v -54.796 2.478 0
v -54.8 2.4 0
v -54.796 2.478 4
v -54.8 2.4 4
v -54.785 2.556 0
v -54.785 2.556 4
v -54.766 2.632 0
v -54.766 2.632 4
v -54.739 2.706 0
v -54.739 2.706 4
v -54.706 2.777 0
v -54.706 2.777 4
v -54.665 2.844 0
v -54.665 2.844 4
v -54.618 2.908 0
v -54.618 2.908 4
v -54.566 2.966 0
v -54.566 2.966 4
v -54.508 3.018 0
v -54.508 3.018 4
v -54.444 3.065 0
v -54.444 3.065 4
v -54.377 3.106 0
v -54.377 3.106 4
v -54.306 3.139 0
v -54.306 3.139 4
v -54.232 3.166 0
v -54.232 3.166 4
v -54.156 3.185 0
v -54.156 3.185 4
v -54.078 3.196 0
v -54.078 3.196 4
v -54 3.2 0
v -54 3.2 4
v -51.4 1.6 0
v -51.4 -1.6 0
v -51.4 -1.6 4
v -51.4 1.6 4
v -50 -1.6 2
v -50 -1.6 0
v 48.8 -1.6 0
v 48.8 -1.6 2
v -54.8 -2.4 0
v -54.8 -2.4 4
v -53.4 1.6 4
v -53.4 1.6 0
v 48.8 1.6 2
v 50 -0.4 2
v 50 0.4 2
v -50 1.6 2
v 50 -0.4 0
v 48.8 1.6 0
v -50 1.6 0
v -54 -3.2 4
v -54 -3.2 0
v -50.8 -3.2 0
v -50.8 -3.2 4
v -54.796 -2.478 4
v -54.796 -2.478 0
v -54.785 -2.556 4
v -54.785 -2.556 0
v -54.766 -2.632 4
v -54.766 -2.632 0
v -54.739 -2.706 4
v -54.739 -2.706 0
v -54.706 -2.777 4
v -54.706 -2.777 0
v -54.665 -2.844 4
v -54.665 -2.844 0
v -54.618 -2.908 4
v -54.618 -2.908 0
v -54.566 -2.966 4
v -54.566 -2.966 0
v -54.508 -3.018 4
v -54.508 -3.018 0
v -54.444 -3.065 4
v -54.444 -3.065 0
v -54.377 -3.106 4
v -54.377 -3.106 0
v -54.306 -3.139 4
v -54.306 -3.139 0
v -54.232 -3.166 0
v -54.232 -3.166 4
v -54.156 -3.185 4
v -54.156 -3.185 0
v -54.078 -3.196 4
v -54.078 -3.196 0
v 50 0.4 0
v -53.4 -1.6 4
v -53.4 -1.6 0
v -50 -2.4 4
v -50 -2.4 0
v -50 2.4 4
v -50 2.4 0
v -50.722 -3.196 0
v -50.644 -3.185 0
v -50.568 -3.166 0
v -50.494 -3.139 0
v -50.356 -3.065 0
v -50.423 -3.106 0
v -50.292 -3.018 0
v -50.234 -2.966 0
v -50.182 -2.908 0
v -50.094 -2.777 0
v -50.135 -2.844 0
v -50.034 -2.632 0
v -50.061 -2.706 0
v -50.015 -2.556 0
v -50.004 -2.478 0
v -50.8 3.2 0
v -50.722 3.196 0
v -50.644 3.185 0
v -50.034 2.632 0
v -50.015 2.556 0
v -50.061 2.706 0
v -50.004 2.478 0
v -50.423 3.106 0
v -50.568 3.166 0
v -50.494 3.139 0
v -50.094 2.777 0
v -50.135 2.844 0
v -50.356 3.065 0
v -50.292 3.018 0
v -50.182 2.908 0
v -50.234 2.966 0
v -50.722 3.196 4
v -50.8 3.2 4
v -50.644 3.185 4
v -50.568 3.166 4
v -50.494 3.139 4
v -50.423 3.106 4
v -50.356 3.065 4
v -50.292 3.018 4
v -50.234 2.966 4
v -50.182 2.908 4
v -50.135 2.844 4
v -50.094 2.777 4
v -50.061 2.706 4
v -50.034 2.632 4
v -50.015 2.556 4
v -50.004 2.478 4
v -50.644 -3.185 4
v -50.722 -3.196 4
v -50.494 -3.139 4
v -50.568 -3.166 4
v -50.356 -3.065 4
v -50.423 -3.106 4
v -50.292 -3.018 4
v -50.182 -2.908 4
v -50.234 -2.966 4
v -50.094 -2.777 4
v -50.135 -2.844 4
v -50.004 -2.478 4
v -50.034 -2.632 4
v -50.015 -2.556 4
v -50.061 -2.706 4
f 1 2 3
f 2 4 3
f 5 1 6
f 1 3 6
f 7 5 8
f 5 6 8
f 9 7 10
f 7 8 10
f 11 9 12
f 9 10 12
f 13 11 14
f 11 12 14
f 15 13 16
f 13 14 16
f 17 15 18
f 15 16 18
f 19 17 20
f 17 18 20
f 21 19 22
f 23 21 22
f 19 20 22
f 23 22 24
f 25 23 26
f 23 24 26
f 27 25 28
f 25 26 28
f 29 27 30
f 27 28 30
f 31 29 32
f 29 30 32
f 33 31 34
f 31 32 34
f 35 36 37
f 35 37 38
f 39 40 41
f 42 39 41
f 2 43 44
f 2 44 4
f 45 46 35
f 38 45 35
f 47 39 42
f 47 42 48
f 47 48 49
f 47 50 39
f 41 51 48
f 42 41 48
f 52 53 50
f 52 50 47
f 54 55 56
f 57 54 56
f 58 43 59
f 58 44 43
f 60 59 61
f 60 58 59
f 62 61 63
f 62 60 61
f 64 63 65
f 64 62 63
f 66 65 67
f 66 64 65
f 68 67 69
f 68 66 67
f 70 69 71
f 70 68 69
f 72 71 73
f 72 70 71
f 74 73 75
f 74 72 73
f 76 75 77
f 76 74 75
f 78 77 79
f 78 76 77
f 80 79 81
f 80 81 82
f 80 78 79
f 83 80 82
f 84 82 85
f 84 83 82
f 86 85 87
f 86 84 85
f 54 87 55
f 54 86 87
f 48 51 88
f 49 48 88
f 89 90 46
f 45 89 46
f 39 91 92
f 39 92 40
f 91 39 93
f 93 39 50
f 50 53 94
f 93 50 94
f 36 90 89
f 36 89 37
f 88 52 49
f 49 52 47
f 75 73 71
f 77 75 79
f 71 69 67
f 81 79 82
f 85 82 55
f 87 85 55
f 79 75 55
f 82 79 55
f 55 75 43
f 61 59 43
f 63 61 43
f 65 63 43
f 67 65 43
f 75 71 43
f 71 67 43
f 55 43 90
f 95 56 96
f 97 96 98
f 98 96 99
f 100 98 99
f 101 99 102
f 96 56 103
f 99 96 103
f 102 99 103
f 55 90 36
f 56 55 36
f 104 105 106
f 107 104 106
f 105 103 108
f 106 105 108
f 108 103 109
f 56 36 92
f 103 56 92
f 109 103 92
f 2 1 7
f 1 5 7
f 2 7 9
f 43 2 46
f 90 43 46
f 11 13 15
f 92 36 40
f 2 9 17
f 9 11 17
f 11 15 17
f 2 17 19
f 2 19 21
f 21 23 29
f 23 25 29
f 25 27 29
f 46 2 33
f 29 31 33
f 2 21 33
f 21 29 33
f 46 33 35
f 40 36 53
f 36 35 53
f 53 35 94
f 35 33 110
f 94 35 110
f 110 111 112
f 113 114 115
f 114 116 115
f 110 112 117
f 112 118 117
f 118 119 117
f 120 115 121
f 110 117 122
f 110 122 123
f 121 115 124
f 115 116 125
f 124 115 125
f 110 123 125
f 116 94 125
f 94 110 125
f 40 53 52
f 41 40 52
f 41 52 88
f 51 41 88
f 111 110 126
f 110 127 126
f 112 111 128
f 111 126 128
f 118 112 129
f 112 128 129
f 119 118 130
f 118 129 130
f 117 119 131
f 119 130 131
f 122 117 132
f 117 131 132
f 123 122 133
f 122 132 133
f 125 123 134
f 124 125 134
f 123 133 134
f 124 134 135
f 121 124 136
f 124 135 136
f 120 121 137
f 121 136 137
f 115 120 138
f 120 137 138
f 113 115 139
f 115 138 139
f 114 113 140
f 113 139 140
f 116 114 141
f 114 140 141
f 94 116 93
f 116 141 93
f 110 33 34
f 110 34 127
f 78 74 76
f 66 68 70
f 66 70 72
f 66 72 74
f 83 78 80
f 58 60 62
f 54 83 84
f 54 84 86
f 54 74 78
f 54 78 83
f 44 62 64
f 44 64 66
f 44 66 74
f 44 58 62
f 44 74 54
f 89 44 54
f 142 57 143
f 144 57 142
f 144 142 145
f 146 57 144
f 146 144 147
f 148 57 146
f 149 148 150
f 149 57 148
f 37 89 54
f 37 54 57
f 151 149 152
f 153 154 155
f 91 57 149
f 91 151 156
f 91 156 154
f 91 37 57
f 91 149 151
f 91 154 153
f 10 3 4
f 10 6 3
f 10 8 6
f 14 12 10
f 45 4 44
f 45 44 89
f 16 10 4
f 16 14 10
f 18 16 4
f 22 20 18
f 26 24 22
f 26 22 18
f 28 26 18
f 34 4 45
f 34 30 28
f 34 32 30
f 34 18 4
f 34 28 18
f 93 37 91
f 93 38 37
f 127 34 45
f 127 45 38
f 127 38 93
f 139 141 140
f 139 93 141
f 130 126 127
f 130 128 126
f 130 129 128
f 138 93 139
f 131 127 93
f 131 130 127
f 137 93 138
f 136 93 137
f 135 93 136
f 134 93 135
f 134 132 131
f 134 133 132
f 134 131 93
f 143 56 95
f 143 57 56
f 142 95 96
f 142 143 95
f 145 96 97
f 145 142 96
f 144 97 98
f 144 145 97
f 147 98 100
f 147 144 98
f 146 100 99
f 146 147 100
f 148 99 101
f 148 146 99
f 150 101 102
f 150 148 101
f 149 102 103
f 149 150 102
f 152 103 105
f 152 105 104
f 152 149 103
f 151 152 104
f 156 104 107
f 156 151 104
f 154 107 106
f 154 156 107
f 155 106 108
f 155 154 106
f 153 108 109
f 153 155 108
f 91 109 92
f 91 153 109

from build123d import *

# Parameters (mm, degrees)
F0_W     = 100
F0_H     = 3.2
F1_DEPTH = 2
F2_SIZE  = 1.2
F3_W     = 4.8
F3_H     = 6.4
F3_W_2   = 2
F3_H_2   = 3.2
F4_DEPTH = 4
F5_R     = 0.8


with BuildPart() as f1:
    # F0 (on Top) → F1 (new body)
    with BuildSketch(Plane.XY):
        Rectangle(F0_W, F0_H)
    extrude(amount=F1_DEPTH)

    # F2
    f2_edges = [f1.edges().sort_by_distance(p)[0] for p in [
        (50, 1.6, 1),
        (50, -1.6, 1),
    ]]
    chamfer(f2_edges, length=F2_SIZE)

    # F3 (on Top) → F4 (join)
    with BuildSketch(Plane.XY):
        with Locations((-52.4, 0)):
            Rectangle(F3_W, F3_H)
        with Locations((-52.4, 0)):
            Rectangle(F3_W_2, F3_H_2, mode=Mode.SUBTRACT)
    extrude(amount=F4_DEPTH)

    # F5
    f5_edges = [f1.edges().sort_by_distance(p)[0] for p in [
        (-54.8, 3.2, 2),
        (-50, 3.2, 2),
        (-50, -3.2, 2),
        (-54.8, -3.2, 2),
    ]]
    fillet(f5_edges, radius=F5_R)


solid = f1.part
